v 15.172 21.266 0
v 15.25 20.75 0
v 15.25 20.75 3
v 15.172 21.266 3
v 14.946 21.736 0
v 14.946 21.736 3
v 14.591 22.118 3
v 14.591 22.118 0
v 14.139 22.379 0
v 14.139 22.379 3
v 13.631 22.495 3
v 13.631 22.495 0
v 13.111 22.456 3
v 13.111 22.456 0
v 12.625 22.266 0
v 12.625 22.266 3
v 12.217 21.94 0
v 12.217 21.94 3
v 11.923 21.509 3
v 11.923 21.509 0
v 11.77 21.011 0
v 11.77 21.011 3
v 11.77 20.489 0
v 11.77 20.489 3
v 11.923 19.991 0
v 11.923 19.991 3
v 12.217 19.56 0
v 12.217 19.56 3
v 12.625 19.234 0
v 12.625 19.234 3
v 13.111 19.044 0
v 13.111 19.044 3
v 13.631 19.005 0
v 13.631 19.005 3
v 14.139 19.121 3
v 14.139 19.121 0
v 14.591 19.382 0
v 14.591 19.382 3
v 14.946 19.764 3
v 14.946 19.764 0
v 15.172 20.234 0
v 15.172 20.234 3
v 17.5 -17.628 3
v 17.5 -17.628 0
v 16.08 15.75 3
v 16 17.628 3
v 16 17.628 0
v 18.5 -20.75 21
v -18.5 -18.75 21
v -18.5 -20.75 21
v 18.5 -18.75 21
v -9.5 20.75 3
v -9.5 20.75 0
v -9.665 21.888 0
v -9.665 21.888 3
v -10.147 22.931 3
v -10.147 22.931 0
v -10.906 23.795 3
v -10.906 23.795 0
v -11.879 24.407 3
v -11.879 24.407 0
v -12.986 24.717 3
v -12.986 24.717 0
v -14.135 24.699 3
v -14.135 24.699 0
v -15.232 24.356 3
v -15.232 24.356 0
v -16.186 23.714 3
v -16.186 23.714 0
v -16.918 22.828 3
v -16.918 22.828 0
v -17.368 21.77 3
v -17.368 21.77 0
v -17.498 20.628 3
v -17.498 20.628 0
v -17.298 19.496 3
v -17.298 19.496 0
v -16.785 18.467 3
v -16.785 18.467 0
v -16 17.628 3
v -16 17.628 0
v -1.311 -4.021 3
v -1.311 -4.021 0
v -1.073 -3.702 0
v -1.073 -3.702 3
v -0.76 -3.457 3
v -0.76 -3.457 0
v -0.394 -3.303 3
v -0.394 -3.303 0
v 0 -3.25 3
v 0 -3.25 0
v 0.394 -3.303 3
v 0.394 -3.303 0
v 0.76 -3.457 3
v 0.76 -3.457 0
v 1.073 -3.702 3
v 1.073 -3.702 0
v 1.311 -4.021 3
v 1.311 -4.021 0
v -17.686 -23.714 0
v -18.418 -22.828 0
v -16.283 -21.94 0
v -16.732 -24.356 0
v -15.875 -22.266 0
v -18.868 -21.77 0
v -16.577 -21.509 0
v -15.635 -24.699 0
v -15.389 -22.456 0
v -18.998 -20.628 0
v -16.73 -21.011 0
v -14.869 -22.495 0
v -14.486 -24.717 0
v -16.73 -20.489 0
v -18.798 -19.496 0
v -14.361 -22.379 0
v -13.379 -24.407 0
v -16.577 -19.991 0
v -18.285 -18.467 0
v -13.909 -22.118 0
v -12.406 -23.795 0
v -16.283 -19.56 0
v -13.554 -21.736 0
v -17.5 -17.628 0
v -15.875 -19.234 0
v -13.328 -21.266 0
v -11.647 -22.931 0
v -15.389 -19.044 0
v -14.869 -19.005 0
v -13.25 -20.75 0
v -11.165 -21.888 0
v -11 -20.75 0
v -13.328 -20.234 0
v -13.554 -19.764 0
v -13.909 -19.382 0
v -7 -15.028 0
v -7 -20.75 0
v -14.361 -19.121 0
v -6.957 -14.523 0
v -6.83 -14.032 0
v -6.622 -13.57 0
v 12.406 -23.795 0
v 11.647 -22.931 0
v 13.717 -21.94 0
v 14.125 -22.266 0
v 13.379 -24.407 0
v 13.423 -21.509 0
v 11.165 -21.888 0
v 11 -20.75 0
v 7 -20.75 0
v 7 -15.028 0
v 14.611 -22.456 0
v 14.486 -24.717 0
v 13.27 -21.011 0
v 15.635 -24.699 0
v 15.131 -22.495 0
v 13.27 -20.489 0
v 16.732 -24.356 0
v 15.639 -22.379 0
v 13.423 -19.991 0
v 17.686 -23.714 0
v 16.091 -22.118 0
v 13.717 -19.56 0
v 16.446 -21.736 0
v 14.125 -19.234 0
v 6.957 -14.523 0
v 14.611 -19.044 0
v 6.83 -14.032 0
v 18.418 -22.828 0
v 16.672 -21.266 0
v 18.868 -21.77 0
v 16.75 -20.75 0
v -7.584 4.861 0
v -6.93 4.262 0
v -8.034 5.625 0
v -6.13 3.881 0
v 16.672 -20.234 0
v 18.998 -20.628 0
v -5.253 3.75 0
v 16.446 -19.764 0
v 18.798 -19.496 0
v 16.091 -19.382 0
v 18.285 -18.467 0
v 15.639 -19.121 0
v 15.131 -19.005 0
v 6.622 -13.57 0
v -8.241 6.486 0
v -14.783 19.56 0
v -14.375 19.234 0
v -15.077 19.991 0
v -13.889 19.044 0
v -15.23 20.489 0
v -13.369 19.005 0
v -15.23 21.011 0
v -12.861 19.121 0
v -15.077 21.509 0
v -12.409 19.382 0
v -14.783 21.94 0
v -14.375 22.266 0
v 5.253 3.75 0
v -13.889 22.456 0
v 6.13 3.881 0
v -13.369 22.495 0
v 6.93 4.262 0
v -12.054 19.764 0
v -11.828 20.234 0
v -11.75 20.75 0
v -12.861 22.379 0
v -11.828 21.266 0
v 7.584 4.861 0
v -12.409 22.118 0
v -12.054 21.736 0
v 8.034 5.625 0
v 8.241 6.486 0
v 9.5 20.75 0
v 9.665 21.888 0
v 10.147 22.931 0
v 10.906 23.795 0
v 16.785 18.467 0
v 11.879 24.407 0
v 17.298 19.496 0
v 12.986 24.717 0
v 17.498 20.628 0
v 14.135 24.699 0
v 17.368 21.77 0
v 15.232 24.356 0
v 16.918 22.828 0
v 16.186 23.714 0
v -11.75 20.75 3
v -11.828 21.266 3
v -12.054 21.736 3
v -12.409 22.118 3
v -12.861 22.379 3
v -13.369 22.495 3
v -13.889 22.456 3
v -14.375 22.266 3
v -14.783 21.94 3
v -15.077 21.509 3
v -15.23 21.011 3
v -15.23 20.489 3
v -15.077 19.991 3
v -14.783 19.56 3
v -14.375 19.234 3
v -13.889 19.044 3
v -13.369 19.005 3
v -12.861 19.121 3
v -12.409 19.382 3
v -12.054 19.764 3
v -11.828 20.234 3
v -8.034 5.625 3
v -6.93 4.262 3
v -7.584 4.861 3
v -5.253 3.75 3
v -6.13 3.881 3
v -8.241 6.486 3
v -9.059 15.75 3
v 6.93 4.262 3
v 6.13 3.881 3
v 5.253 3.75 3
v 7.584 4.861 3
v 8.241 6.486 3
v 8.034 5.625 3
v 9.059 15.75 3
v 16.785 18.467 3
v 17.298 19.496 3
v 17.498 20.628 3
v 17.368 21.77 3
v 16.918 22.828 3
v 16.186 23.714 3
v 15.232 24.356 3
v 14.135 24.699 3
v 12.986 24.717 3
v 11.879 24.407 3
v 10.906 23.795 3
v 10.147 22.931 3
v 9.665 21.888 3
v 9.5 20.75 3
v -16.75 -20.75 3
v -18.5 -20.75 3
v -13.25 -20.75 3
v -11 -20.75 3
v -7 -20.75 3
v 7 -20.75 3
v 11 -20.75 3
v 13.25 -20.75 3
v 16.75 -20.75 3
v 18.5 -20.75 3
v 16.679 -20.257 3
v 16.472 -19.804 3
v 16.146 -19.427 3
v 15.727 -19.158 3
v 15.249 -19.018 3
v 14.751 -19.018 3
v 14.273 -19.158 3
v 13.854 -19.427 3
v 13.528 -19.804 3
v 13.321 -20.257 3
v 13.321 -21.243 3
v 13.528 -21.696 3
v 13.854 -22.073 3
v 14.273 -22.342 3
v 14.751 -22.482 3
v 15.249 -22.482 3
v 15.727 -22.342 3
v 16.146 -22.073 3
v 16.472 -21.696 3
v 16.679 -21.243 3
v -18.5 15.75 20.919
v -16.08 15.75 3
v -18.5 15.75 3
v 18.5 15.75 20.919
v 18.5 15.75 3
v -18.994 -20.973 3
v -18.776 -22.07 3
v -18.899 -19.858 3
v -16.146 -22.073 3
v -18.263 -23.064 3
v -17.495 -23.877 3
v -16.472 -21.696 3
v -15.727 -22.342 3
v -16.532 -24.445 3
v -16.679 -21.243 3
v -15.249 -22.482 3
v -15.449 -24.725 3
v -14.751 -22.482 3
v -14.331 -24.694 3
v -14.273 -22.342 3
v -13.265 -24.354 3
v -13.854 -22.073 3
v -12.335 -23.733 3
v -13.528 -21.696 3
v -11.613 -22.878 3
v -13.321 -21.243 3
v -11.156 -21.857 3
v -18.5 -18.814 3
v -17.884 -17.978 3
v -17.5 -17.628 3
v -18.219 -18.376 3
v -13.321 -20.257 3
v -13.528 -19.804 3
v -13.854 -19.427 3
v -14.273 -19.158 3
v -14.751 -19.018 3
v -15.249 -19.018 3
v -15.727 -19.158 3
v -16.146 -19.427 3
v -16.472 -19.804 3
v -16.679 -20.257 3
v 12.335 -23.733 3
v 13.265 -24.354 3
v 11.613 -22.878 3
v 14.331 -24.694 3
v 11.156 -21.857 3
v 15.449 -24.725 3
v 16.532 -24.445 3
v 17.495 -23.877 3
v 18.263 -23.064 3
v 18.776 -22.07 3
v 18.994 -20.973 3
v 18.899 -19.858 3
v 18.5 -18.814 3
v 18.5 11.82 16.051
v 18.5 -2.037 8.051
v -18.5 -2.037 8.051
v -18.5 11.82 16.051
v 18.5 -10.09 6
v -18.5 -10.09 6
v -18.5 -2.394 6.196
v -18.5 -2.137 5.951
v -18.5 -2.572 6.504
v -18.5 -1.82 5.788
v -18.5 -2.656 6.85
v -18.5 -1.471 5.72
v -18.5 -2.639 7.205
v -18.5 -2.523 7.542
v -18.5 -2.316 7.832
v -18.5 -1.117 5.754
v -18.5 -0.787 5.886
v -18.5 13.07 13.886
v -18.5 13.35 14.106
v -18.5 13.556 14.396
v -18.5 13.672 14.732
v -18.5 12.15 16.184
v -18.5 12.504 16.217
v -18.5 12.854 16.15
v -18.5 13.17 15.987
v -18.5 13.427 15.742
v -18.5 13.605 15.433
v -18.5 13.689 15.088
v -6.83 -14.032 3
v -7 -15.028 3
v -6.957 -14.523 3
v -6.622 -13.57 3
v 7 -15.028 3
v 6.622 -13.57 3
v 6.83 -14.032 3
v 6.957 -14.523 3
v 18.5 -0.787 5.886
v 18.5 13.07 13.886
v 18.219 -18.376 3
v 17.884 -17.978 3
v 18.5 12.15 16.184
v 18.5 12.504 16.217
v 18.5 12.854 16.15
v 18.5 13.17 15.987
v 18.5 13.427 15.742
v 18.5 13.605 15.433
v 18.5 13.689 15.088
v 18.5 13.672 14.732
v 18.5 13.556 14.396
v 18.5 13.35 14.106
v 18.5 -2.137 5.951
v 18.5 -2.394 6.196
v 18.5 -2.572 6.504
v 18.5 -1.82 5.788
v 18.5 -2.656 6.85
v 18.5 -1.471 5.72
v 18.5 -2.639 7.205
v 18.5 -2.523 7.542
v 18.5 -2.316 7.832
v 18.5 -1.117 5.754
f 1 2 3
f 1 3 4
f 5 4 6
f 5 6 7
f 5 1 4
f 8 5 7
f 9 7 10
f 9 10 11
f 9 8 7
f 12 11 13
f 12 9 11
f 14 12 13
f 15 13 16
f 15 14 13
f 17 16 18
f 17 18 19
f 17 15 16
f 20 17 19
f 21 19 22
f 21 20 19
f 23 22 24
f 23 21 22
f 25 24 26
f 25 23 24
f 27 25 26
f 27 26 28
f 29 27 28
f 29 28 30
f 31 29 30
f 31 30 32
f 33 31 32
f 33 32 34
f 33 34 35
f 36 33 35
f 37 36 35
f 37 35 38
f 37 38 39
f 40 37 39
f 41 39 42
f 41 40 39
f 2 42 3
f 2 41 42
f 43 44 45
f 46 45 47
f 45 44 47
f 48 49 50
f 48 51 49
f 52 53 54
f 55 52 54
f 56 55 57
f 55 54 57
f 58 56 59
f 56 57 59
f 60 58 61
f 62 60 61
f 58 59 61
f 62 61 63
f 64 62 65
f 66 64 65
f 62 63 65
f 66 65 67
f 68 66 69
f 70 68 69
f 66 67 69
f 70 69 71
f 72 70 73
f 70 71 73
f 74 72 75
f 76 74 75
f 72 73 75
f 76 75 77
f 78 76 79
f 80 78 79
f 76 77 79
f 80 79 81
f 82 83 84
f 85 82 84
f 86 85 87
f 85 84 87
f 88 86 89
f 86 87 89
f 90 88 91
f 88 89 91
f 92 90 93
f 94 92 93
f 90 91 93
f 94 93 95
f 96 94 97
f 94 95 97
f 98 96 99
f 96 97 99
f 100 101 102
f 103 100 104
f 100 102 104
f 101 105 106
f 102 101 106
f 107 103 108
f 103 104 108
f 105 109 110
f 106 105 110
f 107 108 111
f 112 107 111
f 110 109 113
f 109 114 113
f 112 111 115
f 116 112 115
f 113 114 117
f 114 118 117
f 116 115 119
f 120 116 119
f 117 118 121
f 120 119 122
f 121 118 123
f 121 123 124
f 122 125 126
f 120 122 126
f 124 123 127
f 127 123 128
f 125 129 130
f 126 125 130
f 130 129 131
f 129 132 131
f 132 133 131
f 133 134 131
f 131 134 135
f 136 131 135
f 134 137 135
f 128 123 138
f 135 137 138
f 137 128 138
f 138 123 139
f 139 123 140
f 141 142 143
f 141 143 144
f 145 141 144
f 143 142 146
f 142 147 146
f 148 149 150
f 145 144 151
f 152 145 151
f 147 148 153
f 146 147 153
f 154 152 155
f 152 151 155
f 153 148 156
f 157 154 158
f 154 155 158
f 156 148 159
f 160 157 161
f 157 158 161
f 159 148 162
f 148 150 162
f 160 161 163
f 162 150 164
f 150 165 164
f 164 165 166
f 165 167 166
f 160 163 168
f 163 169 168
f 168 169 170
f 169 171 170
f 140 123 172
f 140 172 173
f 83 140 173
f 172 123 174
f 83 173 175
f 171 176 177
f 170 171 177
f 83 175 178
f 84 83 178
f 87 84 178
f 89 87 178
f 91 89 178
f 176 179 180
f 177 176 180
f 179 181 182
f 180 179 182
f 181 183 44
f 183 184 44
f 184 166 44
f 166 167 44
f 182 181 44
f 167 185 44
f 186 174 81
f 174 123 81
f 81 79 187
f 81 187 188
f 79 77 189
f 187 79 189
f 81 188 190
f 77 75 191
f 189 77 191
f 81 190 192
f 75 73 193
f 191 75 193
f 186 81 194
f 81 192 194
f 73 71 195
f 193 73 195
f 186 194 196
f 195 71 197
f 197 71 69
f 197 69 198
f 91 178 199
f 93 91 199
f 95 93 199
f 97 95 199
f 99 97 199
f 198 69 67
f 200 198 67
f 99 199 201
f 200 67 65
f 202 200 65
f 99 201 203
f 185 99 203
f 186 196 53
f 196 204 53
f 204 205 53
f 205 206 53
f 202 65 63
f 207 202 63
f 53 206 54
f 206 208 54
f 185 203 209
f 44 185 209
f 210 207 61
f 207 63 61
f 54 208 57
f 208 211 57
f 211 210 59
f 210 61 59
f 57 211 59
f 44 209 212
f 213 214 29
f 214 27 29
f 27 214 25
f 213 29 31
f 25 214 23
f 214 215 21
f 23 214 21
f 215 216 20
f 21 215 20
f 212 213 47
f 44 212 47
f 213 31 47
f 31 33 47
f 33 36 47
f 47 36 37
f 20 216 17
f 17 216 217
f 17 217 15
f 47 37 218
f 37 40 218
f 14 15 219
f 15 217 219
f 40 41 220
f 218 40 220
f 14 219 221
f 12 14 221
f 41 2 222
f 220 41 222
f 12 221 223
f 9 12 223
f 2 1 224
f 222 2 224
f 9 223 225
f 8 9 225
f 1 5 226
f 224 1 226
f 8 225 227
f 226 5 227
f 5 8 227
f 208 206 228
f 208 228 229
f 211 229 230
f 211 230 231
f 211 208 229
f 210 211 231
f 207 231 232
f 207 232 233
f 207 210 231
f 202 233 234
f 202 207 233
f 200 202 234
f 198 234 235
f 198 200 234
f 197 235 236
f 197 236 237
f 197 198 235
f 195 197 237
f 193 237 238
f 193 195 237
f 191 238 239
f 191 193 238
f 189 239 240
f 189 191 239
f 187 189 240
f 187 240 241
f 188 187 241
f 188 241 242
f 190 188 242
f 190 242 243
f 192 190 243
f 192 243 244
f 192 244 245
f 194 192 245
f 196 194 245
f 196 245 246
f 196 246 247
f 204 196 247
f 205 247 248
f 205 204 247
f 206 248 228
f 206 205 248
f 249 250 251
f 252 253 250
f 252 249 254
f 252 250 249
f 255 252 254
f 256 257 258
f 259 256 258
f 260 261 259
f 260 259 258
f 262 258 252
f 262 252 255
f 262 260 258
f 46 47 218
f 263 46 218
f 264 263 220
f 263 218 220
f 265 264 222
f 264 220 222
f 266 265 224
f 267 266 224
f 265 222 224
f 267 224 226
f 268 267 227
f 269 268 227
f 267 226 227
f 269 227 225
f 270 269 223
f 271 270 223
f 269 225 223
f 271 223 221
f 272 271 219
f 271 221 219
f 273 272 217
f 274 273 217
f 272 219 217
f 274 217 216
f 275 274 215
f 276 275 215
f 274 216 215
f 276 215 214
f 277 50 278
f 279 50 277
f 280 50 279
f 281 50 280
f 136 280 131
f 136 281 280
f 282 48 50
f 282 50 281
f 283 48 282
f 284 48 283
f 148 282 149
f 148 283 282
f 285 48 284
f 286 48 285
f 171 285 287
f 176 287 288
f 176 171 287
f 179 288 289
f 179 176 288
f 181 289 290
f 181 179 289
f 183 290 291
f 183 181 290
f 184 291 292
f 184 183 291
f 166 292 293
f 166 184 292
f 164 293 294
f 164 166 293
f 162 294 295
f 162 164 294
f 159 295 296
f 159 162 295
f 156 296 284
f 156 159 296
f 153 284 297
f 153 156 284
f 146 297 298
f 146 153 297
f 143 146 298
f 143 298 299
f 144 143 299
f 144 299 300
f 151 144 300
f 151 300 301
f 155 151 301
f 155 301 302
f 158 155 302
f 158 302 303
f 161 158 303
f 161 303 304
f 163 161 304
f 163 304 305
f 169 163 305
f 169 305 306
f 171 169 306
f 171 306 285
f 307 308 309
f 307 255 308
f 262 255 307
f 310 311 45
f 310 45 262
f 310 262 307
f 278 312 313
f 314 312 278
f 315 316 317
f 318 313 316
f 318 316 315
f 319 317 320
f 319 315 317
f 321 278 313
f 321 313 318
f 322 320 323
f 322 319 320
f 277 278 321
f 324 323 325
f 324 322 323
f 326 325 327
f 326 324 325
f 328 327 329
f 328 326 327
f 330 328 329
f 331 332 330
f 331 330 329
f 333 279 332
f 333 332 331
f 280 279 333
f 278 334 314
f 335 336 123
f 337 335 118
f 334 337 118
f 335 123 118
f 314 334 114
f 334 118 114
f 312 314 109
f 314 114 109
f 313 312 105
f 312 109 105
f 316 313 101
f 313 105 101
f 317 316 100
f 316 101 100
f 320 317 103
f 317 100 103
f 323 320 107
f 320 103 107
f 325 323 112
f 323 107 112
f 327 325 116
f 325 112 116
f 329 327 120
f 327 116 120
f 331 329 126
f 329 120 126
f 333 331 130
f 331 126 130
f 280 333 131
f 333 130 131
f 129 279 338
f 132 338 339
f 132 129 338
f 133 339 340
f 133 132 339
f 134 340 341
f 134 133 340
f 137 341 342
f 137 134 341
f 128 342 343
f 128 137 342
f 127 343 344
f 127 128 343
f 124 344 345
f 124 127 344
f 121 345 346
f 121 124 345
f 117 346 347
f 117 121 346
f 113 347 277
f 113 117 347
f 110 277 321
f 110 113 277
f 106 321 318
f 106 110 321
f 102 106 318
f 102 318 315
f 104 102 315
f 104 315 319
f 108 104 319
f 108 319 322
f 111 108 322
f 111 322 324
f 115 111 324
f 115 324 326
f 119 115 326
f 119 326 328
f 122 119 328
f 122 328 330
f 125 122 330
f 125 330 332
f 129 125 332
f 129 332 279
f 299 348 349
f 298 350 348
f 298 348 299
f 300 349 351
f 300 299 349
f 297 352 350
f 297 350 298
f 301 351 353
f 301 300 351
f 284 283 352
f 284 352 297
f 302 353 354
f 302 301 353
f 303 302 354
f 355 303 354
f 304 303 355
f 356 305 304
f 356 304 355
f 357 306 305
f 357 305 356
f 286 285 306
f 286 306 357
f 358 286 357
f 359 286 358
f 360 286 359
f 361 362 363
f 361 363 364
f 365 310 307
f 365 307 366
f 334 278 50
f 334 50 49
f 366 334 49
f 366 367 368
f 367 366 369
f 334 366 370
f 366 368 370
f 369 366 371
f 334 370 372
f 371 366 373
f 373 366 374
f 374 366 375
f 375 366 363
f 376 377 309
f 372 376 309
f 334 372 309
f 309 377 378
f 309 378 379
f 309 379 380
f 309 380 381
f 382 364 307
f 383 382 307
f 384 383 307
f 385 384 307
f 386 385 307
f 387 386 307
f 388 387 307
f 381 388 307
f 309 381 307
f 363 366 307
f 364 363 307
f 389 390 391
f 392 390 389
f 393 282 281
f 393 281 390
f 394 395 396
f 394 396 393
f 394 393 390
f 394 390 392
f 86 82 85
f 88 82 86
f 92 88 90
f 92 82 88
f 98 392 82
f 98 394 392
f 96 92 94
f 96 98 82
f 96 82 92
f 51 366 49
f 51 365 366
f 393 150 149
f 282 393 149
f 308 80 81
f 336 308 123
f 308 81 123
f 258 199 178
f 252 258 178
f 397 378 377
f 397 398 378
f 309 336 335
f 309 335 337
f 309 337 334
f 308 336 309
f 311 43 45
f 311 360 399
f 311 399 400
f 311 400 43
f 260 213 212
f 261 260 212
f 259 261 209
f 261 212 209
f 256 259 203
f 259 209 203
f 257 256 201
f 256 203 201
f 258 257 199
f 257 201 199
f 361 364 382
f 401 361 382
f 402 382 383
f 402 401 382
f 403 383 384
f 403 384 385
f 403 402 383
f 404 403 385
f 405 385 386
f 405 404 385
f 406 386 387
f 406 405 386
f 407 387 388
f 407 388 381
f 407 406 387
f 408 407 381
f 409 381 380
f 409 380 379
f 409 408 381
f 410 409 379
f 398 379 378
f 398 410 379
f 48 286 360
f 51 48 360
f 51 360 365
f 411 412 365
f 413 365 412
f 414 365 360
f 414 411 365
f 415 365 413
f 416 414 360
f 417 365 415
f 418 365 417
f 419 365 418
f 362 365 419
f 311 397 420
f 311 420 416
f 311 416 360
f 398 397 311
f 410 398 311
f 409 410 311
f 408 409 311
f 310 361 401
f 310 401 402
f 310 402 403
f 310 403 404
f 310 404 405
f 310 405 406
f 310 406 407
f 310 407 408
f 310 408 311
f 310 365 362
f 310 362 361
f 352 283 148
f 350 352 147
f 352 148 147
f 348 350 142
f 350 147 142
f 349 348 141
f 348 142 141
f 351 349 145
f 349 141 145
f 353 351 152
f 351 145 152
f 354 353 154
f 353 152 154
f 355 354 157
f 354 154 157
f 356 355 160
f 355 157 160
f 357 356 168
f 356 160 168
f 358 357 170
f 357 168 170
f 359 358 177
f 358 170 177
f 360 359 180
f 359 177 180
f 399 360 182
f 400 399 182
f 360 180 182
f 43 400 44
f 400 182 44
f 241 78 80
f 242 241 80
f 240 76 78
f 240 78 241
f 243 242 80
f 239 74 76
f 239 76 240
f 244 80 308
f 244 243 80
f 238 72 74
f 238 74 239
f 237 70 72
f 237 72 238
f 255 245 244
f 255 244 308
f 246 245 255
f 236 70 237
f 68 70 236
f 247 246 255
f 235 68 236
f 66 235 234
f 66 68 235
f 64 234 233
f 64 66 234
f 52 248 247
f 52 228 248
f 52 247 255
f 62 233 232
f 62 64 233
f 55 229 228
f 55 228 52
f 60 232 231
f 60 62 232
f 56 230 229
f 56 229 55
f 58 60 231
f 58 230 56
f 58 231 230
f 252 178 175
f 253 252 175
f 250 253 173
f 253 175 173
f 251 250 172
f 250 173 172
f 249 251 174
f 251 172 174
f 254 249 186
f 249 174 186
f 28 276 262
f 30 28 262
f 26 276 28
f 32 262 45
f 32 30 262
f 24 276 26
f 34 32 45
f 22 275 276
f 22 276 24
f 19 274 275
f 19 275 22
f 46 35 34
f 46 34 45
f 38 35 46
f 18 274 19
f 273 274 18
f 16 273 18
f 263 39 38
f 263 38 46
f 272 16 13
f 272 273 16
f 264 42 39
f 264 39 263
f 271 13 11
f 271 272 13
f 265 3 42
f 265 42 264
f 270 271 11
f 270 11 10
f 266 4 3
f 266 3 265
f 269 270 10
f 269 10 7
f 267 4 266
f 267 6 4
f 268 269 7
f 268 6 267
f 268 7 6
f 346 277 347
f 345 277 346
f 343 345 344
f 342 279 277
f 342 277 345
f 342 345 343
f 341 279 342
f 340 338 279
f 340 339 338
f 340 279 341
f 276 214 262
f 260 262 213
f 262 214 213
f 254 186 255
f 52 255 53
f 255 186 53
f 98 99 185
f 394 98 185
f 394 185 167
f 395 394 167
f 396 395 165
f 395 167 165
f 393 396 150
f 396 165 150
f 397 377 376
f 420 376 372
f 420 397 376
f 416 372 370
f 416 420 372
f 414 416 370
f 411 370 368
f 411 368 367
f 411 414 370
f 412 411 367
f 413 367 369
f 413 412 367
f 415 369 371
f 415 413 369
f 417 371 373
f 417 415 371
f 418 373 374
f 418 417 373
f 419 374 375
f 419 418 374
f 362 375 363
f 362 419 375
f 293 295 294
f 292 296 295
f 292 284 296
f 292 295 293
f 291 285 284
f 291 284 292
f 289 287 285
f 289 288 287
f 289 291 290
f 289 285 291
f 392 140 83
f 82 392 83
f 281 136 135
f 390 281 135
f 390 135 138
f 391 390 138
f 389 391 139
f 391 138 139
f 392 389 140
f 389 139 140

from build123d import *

# Parameters (mm, degrees)
F0_R     = 1.75
F1_DEPTH = 3
F3_DEPTH = 18.5


with BuildPart() as f1:
    # F0 (on Top) → F1 (new body)
    with BuildSketch(Plane.XY):
        with BuildLine():
            ThreePointArc((16, 17.627501), (15.232051, 24.355551), (9.5, 20.75))
            Line((9.5, 20.75), (8.24144, 6.486319))
            ThreePointArc((8.24144, 6.486319), (7.279001, 4.537417), (5.25305, 3.75))
            Line((5.25305, 3.75), (0, 3.75))
            Line((0, 3.75), (-5.25305, 3.75))
            ThreePointArc((-5.25305, 3.75), (-7.279001, 4.537417), (-8.24144, 6.486319))
            Line((-8.24144, 6.486319), (-9.5, 20.75))
            ThreePointArc((-9.5, 20.75), (-15.232051, 24.355551), (-16, 17.627501))
            Line((-16, 17.627501), (-17.5, -17.627501))
            ThreePointArc((-17.5, -17.627501), (-16.732051, -24.355551), (-11, -20.75))
            Line((-11, -20.75), (-7, -20.75))
            Line((-7, -20.75), (-7, -15.028129))
            ThreePointArc((-7, -15.028129), (-6.903908, -14.274924), (-6.621788, -13.56997))
            Line((-6.621788, -13.56997), (-1.310894, -4.02092))
            ThreePointArc((-1.310894, -4.02092), (0, -3.25), (1.310894, -4.02092))
            Line((1.310894, -4.02092), (6.621788, -13.56997))
            ThreePointArc((6.621788, -13.56997), (6.903908, -14.274924), (7, -15.028129))
            Line((7, -15.028129), (7, -20.75))
            Line((7, -20.75), (11, -20.75))
            ThreePointArc((11, -20.75), (16.732051, -24.355551), (17.5, -17.627501))
            Line((17.5, -17.627501), (16, 17.627501))
        make_face()
        with Locations((-15, -20.75)):
            Circle(F0_R, mode=Mode.SUBTRACT)
        with Locations((15, -20.75)):
            Circle(F0_R, mode=Mode.SUBTRACT)
        with Locations((-13.5, 20.75)):
            Circle(F0_R, mode=Mode.SUBTRACT)
        with Locations((13.5, 20.75)):
            Circle(F0_R, mode=Mode.SUBTRACT)
    extrude(amount=F1_DEPTH)

    # F2 (on Right) → F3 (join, symmetric)
    with BuildSketch(Plane.YZ):
        Polygon((-20.75, 21), (-20.75, 3), (15.75, 3), (15.75, 20.918584), (-10.089746, 6), (-18.75, 21), align=None)
        with BuildLine():
            Line((-2.036543, 8.051443), (11.819864, 16.051443))
            ThreePointArc((11.819864, 16.051443), (13.527395, 15.593911), (13.069864, 13.886379))
            Line((13.069864, 13.886379), (-0.786543, 5.886379))
            ThreePointArc((-0.786543, 5.886379), (-2.494074, 6.343911), (-2.036543, 8.051443))
        make_face(mode=Mode.SUBTRACT)
    extrude(amount=F3_DEPTH, both=True)


solid = f1.part
